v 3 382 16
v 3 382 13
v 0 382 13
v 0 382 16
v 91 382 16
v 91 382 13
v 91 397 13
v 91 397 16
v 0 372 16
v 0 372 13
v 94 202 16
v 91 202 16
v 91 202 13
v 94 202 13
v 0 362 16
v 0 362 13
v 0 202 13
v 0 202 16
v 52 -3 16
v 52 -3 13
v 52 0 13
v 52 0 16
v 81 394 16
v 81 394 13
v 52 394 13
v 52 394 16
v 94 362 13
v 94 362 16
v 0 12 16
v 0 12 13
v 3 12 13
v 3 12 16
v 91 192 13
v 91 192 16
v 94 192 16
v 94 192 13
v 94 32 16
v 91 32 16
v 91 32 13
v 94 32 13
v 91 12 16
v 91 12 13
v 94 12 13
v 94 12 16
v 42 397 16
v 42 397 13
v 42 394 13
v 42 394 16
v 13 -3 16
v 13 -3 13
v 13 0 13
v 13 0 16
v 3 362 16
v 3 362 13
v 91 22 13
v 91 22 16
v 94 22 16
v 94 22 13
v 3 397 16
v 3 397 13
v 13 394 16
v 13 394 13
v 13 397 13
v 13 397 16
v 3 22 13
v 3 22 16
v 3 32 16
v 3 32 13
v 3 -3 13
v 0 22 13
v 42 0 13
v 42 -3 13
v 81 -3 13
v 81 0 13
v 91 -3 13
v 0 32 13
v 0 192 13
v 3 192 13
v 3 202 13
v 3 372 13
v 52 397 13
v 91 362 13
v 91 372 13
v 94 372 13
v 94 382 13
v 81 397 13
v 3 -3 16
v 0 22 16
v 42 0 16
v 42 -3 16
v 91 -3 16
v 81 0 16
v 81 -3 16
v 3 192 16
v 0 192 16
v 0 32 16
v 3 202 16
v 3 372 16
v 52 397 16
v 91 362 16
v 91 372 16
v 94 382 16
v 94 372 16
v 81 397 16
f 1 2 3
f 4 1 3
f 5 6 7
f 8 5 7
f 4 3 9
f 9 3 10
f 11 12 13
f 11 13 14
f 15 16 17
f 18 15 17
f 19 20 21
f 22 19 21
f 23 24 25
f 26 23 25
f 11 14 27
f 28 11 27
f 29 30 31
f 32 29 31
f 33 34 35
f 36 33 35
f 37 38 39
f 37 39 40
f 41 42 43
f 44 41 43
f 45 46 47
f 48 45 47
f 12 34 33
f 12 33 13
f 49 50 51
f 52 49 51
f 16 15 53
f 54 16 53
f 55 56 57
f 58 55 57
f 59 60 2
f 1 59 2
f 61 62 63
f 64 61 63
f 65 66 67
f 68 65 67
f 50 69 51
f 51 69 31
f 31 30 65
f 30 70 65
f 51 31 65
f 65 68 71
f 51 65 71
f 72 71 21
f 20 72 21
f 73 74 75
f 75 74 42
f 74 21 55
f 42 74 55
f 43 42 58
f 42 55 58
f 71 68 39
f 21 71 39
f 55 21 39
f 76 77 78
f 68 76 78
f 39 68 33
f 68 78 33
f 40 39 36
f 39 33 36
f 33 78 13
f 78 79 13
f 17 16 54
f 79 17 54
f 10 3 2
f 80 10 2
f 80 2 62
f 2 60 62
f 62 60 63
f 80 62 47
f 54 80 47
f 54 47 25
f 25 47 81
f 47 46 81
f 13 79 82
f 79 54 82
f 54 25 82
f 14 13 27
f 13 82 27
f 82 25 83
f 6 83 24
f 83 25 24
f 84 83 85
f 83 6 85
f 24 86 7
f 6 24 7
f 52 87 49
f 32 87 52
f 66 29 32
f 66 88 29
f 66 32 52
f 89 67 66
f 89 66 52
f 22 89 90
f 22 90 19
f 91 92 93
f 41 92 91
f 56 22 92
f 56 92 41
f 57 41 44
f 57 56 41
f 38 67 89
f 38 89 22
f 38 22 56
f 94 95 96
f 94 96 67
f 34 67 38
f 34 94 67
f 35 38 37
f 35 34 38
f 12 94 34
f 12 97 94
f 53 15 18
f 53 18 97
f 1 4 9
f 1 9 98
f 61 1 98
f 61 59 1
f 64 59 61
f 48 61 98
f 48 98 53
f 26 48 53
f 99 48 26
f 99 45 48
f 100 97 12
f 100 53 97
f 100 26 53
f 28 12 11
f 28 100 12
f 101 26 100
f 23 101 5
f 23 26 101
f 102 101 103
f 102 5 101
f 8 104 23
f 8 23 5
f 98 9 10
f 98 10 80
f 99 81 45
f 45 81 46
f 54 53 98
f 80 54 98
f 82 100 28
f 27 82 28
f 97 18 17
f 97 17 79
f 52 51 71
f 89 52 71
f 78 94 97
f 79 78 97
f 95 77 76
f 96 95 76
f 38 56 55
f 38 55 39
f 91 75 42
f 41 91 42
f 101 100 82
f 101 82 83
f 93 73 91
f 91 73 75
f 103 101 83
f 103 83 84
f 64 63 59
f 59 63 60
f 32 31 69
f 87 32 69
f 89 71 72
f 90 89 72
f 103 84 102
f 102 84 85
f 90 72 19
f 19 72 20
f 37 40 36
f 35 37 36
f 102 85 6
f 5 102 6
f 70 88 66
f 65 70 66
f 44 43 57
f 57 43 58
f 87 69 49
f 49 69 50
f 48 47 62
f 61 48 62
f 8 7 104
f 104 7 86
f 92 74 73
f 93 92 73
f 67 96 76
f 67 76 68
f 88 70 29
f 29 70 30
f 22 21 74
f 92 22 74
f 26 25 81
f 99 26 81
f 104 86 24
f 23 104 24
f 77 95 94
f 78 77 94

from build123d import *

# Parameters (mm, degrees)
PAD006_DEPTH           = 3
SKETCH012_W            = 3
SKETCH012_H            = 10
POCKET005_DEPTH        = 3
LINEARPATTERN004_COUNT = 3
LINEARPATTERN004_PITCH = 170


with BuildPart() as part:
    # Sketch010 → Pad006 (new body)
    with BuildSketch(Plane.XY):
        Polygon((0, -3), (10, -3), (10, 0), (39, 0), (39, -3), (49, -3), (49, 0), (78, 0), (78, -3), (88, -3), (88, 12), (91, 12), (91, 382), (88, 382), (88, 397), (78, 397), (78, 394), (49, 394), (49, 397), (39, 397), (39, 394), (10, 394), (10, 397), (0, 397), (0, 382), (-3, 382), (-3, 12), (0, 12), align=None)
    extrude(amount=PAD006_DEPTH)

    # Sketch012 → Pocket005 (cut)
    with BuildSketch(Plane.XY.offset(3)):
        with Locations((-1.5, 27)):
            Rectangle(SKETCH012_W, SKETCH012_H)
        with Locations((89.5, 27)):
            Rectangle(SKETCH012_W, SKETCH012_H)
    pocket005 = extrude(amount=-POCKET005_DEPTH, mode=Mode.SUBTRACT)

    # LinearPattern004: Pocket005 ×3
    with Locations(*[(0, i * LINEARPATTERN004_PITCH, 0) for i in range(1, LINEARPATTERN004_COUNT)]):
        add(pocket005, mode=Mode.SUBTRACT)


with BuildPart() as part_1:
    # Body006 placement: moved
    add(part.part.moved(Location((3, 0, 13))))


solid = part_1.part
